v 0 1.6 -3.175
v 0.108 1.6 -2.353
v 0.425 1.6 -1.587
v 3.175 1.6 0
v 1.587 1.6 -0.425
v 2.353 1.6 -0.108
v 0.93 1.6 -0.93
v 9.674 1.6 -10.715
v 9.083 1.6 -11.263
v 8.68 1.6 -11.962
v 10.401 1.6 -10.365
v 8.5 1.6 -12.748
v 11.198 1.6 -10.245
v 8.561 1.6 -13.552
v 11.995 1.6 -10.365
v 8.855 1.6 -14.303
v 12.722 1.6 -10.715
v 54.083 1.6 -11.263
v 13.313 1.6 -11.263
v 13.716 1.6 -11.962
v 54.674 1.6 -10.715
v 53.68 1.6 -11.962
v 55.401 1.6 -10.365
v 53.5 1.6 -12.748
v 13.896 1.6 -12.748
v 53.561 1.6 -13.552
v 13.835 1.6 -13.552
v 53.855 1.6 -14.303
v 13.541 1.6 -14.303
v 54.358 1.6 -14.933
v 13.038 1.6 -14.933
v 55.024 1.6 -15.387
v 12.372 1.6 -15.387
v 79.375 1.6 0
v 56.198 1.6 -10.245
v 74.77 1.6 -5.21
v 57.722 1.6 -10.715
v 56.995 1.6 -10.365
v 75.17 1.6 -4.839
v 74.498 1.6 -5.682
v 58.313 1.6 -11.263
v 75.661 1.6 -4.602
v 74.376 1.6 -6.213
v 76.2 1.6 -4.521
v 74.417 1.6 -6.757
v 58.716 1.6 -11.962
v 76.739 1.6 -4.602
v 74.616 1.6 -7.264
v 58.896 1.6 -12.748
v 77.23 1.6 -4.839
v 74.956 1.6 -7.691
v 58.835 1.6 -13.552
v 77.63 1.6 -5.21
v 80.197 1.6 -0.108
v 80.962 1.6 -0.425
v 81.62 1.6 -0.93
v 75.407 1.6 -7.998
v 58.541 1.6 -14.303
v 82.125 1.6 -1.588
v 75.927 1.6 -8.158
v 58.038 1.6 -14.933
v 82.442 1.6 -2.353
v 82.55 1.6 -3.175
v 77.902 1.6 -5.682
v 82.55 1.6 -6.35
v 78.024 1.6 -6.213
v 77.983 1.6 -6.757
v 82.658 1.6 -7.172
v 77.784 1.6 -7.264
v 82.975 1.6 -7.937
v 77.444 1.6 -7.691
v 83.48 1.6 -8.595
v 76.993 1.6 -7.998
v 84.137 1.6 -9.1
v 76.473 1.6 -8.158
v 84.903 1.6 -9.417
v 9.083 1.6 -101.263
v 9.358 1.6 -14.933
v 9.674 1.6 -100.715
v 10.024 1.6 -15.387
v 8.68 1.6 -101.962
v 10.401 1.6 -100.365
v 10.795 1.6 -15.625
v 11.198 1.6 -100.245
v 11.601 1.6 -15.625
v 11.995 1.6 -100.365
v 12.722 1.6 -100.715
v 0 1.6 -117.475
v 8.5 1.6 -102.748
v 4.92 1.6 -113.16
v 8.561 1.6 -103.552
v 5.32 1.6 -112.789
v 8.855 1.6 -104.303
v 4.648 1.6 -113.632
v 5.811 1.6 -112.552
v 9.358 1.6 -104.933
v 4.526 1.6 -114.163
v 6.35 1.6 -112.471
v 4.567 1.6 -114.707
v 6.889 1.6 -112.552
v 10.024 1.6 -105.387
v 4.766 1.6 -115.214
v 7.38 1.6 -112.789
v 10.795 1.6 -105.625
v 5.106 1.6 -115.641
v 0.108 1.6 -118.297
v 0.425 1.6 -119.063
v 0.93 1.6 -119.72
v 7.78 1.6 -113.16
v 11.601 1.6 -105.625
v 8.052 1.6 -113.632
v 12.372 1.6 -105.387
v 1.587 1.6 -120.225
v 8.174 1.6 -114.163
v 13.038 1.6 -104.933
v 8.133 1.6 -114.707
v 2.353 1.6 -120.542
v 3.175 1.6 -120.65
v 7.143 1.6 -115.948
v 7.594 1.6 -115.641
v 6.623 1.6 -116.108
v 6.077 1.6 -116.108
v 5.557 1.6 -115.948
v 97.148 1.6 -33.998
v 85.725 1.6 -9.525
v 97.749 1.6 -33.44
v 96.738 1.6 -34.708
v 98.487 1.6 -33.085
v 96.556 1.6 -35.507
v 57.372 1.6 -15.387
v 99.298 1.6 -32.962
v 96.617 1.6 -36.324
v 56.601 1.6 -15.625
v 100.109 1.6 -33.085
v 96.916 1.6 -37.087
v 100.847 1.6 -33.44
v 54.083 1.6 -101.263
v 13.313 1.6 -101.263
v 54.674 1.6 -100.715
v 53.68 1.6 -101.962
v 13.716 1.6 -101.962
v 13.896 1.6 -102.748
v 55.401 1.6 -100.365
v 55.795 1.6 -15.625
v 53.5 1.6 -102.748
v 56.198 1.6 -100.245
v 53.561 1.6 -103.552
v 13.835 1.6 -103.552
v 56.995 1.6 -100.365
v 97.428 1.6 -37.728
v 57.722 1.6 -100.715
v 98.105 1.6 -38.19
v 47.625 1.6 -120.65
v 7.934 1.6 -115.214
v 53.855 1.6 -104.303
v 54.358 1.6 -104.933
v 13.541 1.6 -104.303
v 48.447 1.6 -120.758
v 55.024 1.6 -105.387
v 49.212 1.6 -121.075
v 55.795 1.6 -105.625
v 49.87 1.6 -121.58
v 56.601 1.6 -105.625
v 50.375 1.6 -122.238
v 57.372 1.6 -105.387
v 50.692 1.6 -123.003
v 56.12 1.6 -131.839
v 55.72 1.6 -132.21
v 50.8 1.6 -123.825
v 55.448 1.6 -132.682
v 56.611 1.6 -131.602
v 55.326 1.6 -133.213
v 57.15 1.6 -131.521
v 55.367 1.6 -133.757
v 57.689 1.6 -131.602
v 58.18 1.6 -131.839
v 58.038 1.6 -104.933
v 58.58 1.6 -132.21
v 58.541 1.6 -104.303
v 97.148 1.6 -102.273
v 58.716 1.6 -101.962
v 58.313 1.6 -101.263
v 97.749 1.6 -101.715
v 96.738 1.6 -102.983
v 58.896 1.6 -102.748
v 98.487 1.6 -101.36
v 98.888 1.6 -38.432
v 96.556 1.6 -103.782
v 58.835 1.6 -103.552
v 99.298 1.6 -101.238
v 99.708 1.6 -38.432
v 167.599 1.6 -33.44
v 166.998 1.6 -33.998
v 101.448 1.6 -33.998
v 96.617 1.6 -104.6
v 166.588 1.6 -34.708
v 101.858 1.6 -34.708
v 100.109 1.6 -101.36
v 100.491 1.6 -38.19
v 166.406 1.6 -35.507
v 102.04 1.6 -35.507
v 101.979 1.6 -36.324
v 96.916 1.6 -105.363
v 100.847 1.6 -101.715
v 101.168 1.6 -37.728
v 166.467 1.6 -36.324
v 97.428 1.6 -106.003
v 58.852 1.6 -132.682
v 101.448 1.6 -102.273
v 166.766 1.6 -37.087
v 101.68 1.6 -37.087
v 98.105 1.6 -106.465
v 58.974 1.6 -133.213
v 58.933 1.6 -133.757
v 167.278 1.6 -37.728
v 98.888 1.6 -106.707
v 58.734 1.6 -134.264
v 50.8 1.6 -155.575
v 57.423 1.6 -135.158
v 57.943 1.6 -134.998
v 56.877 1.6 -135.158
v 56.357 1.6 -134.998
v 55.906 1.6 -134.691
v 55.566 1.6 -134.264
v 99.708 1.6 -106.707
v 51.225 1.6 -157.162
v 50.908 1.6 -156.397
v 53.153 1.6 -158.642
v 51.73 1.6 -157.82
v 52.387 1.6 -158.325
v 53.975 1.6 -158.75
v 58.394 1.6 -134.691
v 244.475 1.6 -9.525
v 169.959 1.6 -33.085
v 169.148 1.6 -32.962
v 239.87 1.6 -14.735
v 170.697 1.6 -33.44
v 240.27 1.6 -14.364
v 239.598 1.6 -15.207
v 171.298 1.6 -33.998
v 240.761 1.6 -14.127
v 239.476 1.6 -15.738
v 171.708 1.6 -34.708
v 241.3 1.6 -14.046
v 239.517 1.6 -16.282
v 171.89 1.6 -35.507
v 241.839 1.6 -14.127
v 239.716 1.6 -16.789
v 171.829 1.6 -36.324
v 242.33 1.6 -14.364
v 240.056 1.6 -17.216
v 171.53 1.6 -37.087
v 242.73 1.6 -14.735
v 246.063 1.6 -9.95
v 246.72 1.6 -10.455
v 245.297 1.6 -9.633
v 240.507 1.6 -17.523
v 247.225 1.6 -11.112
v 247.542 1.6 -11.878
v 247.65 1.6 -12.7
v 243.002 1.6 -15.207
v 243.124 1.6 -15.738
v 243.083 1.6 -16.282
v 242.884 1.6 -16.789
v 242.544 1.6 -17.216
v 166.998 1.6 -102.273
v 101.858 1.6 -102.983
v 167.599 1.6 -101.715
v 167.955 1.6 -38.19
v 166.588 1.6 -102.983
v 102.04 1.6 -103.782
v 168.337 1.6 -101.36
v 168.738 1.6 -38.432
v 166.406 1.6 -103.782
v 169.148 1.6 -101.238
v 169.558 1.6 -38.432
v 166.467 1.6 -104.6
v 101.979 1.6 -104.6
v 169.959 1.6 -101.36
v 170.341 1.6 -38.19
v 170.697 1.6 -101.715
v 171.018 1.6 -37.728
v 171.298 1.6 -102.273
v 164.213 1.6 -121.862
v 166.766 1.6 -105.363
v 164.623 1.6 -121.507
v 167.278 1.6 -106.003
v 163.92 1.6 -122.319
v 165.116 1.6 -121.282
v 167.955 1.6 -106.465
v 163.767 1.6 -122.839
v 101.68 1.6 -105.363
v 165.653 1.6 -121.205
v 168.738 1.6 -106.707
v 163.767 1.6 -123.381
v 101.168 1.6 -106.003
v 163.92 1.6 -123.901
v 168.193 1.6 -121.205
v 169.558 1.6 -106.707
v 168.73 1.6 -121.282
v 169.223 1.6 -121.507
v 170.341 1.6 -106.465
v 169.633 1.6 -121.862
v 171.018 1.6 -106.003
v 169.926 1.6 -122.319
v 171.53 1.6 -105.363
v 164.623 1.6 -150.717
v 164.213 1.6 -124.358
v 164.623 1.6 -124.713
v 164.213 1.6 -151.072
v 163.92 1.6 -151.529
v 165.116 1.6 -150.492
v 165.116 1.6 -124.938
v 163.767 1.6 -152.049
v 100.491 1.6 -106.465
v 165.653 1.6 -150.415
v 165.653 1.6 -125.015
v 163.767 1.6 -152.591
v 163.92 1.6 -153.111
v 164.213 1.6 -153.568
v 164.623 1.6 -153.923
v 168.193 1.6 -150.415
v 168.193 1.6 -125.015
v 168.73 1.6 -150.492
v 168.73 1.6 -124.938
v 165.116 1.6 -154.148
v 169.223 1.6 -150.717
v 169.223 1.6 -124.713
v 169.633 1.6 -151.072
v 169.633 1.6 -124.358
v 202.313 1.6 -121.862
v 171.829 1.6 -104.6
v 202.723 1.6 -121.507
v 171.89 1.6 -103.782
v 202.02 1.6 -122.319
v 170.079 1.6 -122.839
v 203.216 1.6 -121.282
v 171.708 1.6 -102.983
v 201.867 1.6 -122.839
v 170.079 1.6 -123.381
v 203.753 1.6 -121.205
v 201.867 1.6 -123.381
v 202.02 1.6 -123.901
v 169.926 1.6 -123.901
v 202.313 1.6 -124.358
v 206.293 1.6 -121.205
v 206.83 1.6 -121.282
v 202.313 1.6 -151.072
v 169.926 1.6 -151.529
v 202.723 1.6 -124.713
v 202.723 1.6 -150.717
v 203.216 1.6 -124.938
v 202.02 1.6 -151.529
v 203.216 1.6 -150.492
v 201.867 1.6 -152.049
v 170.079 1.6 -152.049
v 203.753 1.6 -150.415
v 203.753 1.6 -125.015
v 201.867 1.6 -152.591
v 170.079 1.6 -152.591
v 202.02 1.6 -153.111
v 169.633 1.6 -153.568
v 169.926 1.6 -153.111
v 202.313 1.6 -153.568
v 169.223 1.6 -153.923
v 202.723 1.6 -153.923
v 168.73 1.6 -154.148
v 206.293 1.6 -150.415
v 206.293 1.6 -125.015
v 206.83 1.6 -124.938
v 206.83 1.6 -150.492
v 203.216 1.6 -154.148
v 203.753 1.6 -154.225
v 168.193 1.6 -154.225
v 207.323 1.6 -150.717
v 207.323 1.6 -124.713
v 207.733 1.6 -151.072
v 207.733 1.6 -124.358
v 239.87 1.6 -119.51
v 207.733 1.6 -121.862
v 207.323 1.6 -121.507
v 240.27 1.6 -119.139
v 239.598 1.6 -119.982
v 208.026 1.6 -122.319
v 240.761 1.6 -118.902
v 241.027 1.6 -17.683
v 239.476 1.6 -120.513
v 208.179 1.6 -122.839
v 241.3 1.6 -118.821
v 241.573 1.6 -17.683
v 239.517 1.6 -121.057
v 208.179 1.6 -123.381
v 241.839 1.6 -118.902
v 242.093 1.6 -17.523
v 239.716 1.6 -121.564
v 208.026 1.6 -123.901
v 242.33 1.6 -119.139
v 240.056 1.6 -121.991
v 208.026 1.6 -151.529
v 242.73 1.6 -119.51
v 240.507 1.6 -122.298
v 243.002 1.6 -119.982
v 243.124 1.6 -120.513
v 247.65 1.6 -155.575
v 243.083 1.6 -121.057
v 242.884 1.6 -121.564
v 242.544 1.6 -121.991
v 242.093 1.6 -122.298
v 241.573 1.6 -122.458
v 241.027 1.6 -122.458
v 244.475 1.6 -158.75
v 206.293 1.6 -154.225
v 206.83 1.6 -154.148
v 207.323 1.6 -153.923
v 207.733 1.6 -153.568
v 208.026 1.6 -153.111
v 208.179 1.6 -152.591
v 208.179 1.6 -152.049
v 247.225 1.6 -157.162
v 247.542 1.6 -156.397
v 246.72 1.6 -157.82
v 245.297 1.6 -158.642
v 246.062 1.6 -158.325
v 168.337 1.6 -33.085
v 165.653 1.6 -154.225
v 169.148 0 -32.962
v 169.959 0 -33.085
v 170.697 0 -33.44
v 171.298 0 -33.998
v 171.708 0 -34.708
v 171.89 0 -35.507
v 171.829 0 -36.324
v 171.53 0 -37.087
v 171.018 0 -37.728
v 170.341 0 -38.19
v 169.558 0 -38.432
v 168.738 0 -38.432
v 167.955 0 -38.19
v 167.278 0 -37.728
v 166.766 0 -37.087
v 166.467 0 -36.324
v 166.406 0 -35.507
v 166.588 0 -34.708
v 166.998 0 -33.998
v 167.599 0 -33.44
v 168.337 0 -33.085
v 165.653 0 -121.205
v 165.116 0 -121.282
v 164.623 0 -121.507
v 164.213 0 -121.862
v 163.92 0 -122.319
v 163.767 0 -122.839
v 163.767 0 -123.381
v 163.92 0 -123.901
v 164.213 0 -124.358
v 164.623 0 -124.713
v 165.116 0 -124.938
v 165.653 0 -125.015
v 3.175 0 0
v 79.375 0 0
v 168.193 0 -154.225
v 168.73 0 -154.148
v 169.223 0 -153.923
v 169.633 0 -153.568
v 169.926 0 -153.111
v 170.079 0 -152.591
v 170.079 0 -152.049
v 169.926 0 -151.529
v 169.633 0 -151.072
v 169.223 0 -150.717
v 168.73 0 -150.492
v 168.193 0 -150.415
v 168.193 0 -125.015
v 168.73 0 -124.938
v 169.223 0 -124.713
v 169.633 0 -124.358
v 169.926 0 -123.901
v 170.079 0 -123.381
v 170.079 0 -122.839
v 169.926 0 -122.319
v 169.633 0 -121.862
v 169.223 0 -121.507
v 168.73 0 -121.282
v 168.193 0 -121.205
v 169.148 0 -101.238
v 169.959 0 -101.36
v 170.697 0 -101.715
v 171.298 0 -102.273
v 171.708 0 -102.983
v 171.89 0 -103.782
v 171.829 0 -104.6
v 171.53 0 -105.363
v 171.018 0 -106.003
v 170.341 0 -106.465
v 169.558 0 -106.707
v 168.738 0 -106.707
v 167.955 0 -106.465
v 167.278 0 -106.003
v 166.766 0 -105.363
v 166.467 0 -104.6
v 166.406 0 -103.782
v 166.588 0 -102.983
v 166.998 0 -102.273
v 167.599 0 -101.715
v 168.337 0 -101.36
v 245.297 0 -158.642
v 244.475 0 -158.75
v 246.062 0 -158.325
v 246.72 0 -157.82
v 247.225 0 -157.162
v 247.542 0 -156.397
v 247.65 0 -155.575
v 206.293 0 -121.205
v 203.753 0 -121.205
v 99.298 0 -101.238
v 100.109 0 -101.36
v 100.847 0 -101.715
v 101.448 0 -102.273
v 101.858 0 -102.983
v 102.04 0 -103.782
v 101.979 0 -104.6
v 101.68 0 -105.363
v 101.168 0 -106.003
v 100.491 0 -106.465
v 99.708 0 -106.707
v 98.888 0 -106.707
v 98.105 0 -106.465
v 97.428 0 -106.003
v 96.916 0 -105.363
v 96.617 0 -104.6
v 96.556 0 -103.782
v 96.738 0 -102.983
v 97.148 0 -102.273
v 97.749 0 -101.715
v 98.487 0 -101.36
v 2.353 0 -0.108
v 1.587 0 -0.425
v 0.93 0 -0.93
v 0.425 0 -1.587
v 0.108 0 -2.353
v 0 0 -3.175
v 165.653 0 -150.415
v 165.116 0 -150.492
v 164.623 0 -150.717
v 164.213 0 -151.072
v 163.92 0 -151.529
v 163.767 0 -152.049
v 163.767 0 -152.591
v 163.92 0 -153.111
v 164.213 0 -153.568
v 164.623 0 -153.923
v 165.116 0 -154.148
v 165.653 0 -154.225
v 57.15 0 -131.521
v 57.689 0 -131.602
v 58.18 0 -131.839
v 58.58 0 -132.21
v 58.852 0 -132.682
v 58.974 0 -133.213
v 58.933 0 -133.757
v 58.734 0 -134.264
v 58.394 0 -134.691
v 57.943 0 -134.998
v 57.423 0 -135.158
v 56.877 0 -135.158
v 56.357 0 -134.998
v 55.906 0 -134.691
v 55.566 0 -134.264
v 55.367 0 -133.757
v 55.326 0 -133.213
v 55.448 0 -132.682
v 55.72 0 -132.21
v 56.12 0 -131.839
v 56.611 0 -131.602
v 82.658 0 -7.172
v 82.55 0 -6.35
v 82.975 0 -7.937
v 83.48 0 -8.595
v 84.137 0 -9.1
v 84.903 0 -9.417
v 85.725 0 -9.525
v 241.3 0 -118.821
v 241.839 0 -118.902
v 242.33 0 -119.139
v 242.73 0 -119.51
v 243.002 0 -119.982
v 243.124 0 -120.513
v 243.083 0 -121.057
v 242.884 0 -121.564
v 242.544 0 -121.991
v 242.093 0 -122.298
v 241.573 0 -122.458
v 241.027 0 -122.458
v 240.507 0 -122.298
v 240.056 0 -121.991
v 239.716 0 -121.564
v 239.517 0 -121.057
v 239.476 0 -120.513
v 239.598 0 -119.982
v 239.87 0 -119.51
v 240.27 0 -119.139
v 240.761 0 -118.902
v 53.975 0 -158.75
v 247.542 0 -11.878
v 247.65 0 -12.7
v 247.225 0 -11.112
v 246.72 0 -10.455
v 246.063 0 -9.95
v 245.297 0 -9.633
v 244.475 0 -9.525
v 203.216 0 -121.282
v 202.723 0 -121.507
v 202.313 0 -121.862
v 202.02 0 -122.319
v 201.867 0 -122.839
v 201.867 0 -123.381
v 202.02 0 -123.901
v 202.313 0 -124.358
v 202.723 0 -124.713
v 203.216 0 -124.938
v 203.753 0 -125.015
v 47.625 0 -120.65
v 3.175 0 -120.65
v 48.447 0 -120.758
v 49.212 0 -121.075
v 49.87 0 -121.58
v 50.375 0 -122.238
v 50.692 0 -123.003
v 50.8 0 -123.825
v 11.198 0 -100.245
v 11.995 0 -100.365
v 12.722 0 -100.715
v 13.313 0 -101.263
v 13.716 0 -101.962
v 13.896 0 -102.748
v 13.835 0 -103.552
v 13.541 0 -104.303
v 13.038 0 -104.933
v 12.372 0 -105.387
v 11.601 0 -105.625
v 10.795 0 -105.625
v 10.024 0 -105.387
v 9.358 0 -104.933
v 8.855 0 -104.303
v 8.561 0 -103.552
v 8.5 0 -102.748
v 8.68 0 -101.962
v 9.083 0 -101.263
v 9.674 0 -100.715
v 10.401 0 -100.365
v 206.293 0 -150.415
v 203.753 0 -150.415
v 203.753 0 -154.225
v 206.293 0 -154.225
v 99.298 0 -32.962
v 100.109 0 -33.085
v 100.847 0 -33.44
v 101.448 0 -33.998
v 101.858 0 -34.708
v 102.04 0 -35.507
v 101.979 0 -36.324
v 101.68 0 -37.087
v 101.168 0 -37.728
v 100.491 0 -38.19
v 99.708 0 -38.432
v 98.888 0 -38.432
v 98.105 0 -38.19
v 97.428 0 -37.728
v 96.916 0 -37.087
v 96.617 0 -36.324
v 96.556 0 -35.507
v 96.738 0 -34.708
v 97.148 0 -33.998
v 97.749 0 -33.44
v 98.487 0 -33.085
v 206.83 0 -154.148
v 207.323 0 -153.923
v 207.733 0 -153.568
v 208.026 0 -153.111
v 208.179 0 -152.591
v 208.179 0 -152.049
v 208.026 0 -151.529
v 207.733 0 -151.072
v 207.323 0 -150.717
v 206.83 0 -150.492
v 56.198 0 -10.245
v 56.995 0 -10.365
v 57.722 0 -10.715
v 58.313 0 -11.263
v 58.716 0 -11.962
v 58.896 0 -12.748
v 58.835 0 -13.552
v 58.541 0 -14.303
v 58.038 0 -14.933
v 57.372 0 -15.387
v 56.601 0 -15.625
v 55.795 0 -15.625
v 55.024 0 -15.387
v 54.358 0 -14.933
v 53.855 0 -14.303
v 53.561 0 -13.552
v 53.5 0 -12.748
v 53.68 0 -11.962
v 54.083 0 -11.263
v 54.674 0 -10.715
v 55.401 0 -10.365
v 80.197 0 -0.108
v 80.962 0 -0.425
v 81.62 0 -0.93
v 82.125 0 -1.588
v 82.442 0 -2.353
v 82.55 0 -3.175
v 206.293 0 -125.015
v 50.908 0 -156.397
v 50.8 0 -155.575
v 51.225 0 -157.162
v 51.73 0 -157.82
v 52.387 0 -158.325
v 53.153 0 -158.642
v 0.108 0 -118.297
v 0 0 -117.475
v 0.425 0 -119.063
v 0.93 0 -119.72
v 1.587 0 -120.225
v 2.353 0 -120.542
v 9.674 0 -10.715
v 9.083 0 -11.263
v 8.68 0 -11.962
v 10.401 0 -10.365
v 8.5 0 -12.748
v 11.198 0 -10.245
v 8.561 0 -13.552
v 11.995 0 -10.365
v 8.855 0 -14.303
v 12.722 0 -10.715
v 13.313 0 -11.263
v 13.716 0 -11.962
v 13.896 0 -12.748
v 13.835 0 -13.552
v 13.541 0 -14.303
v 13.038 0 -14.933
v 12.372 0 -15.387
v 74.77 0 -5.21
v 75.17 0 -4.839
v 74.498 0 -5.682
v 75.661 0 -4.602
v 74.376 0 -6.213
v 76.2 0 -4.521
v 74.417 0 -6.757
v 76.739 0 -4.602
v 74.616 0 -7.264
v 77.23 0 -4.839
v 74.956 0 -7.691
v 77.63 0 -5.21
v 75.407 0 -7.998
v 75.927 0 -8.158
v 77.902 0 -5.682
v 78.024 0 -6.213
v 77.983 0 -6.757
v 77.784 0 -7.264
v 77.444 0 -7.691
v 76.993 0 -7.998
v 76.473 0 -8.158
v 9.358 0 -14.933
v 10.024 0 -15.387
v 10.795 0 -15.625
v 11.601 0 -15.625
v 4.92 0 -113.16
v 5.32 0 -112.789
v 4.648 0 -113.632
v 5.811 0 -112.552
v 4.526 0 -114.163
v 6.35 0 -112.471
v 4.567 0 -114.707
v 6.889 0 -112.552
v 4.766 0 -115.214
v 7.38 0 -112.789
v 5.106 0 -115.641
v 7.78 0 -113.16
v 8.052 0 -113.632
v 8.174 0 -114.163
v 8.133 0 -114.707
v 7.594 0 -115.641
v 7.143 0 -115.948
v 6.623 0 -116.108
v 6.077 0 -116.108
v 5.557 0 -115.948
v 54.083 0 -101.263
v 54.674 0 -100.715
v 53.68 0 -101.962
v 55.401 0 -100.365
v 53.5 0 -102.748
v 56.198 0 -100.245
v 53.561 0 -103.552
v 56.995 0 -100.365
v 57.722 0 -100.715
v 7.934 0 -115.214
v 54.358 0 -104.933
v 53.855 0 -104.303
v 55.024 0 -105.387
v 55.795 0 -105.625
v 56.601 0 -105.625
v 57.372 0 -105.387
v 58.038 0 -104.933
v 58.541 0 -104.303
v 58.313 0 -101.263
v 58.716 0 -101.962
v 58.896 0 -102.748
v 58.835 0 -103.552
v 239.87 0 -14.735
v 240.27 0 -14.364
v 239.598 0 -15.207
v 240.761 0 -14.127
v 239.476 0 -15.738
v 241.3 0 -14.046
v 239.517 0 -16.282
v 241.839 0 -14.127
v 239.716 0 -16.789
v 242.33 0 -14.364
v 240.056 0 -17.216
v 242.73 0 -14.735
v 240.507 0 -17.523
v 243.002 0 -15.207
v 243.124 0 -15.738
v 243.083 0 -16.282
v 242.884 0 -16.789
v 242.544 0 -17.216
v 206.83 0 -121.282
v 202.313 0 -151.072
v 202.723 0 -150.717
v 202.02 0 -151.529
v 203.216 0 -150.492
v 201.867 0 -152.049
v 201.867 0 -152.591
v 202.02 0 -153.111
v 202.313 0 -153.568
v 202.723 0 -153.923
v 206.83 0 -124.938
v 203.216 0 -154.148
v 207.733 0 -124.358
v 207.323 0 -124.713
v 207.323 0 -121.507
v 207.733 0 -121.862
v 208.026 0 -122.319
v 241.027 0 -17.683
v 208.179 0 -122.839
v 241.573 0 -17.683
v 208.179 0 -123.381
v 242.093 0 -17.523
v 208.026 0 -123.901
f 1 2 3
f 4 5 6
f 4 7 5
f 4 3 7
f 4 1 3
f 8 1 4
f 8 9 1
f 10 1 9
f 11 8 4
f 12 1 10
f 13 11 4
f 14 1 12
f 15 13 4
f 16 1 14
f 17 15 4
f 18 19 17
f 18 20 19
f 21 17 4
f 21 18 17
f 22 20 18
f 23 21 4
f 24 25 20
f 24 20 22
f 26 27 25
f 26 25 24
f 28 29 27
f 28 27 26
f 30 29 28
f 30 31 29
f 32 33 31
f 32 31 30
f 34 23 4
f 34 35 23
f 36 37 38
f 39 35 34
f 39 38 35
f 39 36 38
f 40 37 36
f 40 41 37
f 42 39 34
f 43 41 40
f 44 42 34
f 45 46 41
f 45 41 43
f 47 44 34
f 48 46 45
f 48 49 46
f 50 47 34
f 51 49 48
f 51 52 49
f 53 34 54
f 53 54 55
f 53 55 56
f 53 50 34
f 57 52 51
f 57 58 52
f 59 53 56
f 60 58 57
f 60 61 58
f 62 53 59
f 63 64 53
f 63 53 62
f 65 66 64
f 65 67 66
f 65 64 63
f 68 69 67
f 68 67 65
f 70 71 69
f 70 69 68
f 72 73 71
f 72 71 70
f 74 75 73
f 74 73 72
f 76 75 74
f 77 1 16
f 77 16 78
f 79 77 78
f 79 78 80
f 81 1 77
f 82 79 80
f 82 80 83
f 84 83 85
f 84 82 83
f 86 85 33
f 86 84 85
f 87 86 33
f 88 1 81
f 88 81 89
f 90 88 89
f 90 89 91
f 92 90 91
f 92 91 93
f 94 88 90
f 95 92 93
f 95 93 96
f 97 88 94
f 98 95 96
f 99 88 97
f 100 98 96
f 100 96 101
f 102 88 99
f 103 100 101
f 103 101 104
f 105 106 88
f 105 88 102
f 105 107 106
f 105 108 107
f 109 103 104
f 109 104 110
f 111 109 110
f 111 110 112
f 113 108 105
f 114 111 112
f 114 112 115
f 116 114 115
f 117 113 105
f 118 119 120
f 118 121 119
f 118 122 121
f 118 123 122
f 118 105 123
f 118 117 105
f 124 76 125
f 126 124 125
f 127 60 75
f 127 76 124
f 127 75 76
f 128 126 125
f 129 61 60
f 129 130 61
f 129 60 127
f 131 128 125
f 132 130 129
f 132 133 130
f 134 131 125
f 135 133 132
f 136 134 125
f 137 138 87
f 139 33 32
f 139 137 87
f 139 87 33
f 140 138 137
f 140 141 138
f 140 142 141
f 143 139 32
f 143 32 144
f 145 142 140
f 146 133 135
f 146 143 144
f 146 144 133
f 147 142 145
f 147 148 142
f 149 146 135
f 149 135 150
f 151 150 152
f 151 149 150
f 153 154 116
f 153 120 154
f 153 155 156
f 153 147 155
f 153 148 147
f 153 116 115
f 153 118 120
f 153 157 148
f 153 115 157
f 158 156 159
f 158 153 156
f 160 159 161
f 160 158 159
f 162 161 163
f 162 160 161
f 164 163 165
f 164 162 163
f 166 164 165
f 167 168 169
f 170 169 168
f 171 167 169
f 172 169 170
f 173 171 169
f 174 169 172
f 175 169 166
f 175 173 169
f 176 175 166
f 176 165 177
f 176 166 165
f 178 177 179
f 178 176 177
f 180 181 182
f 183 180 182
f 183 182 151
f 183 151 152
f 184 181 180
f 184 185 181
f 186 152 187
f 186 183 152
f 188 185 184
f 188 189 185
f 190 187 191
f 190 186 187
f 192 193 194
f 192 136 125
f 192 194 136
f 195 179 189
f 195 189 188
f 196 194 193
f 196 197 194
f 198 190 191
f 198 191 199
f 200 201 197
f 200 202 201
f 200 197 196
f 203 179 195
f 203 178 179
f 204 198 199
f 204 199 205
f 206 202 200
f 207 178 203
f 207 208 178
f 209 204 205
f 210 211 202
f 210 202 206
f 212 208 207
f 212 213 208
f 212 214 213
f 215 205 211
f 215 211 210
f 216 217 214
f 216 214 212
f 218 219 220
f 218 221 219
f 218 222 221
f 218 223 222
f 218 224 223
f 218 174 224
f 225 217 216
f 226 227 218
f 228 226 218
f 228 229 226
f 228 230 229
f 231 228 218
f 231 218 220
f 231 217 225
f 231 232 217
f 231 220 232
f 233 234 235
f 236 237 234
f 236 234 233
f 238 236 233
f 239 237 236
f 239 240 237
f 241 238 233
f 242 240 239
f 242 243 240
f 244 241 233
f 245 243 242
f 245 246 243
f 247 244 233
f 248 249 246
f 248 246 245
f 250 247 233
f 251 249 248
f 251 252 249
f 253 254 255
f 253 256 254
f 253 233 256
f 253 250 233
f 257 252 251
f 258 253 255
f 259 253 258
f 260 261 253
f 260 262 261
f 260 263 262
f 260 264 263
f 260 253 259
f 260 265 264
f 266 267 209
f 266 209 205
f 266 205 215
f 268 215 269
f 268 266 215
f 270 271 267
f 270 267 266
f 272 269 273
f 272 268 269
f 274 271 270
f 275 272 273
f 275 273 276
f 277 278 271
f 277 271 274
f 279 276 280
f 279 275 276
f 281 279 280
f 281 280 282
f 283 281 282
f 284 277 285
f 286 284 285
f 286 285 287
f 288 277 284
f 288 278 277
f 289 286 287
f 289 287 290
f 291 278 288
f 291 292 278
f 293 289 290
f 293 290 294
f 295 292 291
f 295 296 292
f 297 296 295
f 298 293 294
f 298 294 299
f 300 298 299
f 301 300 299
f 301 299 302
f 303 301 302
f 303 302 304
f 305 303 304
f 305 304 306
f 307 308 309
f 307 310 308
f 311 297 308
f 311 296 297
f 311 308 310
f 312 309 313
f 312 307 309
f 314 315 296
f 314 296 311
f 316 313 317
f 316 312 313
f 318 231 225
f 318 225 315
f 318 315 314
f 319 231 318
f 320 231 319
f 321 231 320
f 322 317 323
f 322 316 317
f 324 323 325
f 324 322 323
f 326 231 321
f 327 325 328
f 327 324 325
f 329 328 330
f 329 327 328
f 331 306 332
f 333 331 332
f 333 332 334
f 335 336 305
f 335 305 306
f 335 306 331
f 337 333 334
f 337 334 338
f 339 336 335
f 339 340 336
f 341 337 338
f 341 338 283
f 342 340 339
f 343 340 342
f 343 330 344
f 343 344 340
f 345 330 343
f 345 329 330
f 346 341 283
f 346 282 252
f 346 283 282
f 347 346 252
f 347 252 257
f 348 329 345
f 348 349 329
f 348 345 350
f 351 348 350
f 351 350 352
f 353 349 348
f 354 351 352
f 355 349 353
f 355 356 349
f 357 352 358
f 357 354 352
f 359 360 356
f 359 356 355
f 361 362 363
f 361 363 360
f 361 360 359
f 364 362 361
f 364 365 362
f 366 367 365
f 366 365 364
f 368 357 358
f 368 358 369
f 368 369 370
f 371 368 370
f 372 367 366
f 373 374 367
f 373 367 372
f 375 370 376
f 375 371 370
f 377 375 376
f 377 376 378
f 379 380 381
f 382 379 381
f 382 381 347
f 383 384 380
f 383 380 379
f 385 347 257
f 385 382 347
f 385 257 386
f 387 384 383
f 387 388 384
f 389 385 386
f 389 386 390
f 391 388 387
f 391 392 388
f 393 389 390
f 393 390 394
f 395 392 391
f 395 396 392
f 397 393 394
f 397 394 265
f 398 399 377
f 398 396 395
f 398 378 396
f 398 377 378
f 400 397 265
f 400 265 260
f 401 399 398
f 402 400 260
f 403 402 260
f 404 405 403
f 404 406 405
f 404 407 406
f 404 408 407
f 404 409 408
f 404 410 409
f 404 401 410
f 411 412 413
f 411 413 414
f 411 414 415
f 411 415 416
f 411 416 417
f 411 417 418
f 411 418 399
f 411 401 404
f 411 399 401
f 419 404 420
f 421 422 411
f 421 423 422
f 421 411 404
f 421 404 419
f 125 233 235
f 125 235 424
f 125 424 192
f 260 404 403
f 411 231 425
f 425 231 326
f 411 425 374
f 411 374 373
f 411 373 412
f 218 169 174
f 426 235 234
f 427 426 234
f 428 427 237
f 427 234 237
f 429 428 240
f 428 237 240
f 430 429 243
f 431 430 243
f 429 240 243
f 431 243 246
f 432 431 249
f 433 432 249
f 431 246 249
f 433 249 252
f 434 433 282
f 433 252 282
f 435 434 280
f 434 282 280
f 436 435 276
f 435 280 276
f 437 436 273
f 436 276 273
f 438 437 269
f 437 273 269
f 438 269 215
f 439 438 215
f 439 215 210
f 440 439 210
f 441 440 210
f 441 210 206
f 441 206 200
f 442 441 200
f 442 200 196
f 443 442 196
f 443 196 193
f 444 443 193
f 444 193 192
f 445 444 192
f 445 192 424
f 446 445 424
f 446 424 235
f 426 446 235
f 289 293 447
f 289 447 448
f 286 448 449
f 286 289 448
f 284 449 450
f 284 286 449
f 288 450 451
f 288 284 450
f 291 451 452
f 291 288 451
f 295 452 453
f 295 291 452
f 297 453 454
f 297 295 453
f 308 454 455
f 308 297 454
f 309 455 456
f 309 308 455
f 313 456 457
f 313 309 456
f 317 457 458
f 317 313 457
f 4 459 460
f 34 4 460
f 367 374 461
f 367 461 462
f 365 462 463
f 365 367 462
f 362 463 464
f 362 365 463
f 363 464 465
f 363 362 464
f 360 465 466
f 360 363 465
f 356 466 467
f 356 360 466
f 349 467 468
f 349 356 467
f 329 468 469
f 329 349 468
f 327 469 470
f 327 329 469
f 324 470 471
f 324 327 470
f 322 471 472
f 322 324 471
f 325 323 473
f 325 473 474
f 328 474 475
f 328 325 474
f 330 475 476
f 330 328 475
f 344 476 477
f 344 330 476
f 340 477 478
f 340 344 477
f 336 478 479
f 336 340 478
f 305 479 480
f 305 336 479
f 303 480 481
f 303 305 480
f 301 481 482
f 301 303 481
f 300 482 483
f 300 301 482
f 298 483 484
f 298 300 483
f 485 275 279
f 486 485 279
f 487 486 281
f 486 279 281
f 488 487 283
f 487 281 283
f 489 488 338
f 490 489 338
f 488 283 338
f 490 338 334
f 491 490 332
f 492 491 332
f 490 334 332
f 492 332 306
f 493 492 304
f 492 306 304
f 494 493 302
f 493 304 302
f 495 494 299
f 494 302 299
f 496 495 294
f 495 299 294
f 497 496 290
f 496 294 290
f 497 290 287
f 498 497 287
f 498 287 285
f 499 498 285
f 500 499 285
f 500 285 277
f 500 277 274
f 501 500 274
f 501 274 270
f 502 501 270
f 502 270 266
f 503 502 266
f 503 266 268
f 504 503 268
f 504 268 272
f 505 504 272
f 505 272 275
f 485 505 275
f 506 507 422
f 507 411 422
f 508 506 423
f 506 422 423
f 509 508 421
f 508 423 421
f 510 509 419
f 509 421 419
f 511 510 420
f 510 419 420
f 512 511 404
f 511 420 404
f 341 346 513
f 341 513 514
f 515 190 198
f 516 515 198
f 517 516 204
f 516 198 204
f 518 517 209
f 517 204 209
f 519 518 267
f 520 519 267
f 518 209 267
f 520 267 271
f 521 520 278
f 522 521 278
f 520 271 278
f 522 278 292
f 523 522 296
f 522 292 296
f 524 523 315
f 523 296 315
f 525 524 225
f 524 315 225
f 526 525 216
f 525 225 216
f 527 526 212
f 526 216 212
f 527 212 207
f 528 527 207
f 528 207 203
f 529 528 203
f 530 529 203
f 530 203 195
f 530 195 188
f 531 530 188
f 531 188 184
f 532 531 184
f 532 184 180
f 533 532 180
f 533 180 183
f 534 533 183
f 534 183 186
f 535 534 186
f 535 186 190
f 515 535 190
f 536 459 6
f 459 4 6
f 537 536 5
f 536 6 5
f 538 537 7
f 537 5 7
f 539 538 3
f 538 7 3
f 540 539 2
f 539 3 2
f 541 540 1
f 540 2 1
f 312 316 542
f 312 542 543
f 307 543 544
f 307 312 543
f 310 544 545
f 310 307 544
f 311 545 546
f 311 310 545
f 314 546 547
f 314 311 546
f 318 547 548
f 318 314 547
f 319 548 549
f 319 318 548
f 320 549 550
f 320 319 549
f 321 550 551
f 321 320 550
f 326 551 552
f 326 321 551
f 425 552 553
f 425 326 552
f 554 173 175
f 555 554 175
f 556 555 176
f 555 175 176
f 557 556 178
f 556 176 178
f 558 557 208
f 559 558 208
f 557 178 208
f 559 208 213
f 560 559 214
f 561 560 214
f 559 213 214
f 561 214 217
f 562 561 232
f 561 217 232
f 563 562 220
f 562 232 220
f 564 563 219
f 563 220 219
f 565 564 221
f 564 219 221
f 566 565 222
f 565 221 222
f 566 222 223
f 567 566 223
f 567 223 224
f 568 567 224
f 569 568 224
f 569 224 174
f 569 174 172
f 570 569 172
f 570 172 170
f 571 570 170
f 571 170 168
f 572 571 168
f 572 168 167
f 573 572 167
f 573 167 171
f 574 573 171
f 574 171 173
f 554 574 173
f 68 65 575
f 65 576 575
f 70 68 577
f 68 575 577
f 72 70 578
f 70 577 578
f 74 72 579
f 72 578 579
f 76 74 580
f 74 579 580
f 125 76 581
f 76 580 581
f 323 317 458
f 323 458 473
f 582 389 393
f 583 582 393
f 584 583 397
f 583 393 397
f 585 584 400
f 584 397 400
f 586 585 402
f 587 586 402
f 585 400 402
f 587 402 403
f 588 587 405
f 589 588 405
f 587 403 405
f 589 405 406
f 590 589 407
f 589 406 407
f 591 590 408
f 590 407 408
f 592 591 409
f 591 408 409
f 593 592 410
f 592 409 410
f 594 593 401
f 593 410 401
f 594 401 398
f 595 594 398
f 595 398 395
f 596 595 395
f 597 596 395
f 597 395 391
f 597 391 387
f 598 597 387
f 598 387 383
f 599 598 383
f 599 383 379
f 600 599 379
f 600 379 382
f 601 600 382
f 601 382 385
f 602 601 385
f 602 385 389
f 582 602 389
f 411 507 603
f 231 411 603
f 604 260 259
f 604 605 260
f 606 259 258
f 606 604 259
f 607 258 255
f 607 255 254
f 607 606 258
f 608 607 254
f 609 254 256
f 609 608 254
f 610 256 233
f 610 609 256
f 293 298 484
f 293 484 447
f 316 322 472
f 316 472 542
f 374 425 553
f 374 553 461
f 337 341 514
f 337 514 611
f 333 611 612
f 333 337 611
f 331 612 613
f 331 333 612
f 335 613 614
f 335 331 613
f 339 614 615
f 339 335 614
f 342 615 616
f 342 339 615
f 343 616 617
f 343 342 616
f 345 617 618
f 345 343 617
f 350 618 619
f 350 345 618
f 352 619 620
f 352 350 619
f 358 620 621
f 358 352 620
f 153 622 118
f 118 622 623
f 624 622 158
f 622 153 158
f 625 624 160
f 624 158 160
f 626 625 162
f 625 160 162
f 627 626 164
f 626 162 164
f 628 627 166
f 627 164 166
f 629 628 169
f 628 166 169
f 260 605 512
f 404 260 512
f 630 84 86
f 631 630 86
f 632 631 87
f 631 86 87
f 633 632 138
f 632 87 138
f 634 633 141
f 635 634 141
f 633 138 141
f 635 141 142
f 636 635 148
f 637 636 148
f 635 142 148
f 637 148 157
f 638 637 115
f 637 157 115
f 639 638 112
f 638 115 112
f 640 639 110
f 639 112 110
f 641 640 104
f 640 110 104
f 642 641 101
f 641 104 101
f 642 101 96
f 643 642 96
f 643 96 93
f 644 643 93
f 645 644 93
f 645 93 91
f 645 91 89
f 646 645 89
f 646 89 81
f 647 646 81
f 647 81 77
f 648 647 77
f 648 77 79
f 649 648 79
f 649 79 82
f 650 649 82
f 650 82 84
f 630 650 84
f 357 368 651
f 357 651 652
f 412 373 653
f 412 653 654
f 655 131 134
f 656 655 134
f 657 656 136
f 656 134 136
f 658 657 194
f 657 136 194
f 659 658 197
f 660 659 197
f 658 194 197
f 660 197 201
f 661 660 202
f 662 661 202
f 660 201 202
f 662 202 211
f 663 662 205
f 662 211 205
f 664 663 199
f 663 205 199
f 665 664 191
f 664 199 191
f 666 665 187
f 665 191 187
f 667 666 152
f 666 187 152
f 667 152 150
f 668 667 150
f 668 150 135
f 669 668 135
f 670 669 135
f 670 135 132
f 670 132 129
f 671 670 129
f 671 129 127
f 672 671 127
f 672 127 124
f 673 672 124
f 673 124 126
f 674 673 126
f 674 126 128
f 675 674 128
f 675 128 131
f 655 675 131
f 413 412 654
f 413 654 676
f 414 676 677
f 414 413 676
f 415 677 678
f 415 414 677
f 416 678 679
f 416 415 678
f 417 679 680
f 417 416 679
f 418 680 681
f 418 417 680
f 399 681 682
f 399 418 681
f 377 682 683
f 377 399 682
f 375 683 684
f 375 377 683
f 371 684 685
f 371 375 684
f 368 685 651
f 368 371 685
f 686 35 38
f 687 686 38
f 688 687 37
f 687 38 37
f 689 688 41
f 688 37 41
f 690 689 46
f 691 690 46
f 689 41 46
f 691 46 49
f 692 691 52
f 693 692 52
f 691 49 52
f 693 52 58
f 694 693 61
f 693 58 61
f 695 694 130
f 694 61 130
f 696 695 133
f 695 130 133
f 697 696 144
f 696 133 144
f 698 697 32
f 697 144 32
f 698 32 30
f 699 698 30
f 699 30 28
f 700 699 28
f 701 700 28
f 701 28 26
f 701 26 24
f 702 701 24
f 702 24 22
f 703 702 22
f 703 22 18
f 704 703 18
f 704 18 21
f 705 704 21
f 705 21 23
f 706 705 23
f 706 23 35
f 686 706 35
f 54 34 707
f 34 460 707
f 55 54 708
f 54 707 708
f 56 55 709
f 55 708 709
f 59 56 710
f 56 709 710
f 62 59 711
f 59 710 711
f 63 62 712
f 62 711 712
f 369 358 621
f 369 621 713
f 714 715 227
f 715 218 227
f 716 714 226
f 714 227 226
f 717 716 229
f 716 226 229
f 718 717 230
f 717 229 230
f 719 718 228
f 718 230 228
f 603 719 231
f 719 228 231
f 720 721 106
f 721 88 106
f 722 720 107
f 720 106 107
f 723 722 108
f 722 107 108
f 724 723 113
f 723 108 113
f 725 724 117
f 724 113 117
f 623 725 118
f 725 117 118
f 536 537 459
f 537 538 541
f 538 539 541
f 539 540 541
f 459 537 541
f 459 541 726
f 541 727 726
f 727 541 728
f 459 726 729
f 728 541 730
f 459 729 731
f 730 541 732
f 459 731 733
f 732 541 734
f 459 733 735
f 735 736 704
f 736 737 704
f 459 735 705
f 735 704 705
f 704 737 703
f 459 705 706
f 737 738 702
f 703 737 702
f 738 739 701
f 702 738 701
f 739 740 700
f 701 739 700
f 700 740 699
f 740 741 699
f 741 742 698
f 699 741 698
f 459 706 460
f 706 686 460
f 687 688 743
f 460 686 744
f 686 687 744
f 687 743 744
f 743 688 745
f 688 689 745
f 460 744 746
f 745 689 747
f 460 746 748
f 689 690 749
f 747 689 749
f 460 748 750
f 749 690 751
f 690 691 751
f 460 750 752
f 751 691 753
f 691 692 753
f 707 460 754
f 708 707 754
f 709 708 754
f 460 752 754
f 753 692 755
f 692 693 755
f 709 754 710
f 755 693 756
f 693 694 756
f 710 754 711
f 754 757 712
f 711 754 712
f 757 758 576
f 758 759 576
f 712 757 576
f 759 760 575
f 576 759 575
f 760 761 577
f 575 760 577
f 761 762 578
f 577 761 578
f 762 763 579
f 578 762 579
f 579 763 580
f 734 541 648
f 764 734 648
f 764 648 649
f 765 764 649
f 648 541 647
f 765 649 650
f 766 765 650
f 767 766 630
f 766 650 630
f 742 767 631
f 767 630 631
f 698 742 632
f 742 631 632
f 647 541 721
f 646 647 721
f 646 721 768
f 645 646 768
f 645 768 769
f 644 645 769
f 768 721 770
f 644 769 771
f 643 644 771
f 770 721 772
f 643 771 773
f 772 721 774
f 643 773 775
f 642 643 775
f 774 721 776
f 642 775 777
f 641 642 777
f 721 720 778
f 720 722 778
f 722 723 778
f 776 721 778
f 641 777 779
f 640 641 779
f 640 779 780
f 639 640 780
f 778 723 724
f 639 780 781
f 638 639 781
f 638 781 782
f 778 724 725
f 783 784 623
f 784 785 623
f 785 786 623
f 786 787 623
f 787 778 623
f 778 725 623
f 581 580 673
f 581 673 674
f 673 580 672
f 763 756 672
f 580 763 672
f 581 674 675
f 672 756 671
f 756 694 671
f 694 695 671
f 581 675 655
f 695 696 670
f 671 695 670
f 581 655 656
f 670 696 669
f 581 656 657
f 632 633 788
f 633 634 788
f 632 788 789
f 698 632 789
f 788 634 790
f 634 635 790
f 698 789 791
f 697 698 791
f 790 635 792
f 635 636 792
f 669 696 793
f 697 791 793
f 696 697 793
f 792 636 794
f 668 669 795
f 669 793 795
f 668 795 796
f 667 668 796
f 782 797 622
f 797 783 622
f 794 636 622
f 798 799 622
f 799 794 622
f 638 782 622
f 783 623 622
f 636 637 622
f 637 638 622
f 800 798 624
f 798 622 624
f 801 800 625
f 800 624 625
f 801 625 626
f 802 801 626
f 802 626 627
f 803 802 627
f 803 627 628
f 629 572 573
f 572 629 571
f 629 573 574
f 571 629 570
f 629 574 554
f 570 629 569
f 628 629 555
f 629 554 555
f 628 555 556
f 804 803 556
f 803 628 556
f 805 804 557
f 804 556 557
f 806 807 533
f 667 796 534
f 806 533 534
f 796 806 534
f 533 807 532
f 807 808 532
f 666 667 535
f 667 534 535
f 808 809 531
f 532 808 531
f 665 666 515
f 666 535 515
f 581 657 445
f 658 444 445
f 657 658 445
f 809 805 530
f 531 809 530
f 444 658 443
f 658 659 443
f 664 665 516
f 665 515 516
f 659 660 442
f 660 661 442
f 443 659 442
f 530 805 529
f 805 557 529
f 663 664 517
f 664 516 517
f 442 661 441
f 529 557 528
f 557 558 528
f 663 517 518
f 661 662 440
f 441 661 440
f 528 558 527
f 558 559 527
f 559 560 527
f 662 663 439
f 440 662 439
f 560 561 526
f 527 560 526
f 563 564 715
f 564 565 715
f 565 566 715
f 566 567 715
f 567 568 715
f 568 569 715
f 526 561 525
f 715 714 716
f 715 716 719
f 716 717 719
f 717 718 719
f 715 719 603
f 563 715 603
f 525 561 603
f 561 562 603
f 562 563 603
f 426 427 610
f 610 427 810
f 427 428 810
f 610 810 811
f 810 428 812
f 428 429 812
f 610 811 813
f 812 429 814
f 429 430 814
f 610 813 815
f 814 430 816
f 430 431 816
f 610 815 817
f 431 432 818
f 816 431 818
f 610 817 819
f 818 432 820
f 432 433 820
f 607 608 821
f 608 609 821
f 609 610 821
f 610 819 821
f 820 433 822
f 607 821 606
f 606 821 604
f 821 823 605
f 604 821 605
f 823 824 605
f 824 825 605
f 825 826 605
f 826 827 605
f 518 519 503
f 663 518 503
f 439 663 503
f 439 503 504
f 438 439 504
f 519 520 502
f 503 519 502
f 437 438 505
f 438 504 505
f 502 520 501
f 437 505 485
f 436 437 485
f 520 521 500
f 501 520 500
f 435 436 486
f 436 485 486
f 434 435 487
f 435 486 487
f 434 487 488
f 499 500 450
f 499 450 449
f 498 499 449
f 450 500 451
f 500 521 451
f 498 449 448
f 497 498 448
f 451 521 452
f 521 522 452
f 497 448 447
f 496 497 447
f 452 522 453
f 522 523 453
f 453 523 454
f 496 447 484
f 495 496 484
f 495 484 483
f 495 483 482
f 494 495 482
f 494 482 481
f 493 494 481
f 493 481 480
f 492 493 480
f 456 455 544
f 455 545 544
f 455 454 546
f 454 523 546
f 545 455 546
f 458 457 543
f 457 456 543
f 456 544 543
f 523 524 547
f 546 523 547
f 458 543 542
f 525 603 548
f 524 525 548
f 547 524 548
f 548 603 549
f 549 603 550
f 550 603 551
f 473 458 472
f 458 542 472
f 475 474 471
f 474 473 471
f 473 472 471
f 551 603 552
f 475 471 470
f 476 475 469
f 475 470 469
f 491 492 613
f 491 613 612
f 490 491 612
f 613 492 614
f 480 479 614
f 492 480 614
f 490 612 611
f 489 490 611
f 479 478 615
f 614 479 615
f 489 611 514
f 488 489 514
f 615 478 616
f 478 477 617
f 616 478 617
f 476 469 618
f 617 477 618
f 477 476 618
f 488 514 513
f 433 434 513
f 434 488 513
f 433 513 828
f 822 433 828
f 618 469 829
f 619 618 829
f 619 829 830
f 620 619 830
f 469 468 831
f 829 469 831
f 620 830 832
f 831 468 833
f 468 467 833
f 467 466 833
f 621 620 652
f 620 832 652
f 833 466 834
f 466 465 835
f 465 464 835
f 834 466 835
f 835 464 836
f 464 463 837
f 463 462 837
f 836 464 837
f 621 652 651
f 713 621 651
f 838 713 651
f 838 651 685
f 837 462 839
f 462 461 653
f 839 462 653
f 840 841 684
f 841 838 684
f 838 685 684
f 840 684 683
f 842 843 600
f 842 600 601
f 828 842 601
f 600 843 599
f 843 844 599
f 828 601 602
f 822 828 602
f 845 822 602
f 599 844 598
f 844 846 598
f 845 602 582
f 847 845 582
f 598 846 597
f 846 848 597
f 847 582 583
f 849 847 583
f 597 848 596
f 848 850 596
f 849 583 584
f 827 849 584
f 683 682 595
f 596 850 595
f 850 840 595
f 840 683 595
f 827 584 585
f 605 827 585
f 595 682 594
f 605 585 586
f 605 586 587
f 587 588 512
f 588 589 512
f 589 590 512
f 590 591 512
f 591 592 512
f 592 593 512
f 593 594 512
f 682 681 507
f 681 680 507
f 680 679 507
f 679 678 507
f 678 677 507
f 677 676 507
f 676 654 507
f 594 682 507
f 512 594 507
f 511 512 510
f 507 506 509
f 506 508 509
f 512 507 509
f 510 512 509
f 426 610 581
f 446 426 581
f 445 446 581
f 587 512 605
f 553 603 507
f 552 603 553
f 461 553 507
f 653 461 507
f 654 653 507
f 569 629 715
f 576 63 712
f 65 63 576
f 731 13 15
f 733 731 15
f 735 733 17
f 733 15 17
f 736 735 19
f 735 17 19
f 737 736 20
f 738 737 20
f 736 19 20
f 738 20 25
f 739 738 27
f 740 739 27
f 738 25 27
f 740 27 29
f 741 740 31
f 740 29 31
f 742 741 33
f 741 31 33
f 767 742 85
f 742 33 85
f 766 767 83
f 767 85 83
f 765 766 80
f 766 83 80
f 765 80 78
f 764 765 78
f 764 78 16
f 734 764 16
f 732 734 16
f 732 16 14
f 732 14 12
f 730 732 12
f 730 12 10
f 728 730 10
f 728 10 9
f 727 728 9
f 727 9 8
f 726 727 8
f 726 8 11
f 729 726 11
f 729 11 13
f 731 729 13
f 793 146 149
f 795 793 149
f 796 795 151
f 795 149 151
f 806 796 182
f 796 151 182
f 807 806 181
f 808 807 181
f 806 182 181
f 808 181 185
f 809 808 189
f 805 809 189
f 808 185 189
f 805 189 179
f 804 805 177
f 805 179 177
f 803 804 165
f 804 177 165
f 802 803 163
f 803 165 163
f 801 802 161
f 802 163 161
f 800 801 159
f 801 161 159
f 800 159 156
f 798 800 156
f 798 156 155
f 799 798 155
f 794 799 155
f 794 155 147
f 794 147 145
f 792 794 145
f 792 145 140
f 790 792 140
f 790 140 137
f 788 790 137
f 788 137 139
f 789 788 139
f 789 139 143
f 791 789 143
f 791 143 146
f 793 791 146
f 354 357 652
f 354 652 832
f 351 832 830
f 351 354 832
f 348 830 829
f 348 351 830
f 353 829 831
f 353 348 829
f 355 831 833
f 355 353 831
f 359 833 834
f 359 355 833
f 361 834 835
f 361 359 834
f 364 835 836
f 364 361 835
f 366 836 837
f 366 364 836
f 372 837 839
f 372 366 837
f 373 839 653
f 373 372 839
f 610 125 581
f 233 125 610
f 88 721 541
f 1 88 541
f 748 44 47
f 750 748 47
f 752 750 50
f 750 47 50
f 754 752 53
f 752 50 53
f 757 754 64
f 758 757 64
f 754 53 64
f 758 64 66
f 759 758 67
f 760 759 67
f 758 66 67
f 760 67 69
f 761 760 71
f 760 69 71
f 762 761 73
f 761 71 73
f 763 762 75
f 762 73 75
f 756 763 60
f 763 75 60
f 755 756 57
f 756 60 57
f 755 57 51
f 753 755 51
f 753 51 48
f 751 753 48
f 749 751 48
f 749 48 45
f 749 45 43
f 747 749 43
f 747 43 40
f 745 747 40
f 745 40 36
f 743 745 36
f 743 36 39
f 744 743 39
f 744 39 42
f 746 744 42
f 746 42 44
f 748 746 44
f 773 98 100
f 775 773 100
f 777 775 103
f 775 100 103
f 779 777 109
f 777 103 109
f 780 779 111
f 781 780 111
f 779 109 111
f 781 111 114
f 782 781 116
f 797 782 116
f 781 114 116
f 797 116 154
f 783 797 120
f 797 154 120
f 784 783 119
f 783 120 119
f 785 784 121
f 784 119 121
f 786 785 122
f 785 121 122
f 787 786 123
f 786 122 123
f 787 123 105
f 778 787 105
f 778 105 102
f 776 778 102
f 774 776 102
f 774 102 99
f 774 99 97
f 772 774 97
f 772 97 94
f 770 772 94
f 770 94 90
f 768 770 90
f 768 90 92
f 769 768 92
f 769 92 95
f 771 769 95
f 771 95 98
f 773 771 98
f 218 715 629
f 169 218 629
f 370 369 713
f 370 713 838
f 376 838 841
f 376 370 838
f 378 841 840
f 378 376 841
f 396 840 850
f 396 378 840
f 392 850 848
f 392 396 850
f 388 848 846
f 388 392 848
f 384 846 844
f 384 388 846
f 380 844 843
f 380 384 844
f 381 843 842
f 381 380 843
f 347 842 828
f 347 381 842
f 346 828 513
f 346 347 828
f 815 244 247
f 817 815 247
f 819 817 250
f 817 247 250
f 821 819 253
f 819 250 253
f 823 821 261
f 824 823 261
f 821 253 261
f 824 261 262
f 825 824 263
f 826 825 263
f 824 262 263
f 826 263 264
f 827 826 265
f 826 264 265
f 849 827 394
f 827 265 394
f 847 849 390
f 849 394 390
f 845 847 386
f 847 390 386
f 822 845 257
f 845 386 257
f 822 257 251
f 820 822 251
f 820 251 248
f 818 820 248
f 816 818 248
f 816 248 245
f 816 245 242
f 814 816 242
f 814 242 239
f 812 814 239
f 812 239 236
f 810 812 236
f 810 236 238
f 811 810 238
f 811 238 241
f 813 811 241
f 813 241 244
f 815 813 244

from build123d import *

# Parameters (mm, degrees)
BOSS_EXTRUDE1_DEPTH            = 1.6002
SKETCH3_W                      = 165.1
SKETCH3_H                      = 9.525
CUT_EXTRUDE1_DEPTH             = 295.167716856
FILLET1_R                      = 3.175
FUSE_ZIPTIE_MOUNTS_DEPTH       = 295.167716856
SKETCH5_R                      = 2.75
CONTACTOR_MOUNTING_HOLES_DEPTH = 295.167716856
SKETCH6_R                      = 1.8288
CUT_EXTRUDE2_DEPTH             = 295.167716856
SKETCH7_R                      = 2.7051
CUT_EXTRUDE3_DEPTH             = 295.167716856


with BuildPart() as part:
    # Sketch1 → Boss-Extrude1 (new body)
    with BuildSketch(Plane(origin=(0, 0, 0), x_dir=(1, 0, 0), z_dir=(0, 1, 0))):
        Polygon((0, 0), (247.65, 0), (247.65, 158.75), (50.8, 158.75), (50.8, 120.65), (0, 120.65), align=None)
    extrude(amount=BOSS_EXTRUDE1_DEPTH)

    # Sketch3 → Cut-Extrude1 (cut, through all)
    with BuildSketch(Plane(origin=(0, 1.6002, 0), x_dir=(1, 0, 0), z_dir=(0, 1, 0))):
        with Locations((165.1, 4.7625)):
            Rectangle(SKETCH3_W, SKETCH3_H)
    extrude(amount=-CUT_EXTRUDE1_DEPTH, mode=Mode.SUBTRACT)

    # Fillet1
    fillet1_edges = [part.edges().sort_by_distance(p)[0] for p in [
        (247.65, 0.8001, -158.75),
        (0, 0.8001, 0),
        (0, 0.8001, -120.65),
        (50.8, 0.8001, -120.65),
        (50.8, 0.8001, -158.75),
        (82.55, 0.8001, 0),
        (82.55, 0.8001, -9.525),
        (247.65, 0.8001, -9.525),
    ]]
    fillet(fillet1_edges, radius=FILLET1_R)

    # Sketch4 → Fuse Ziptie Mounts (cut, through all)
    with BuildSketch(Plane(origin=(0, 1.6002, 0), x_dir=(1, 0, 0), z_dir=(0, 1, 0))):
        with BuildLine():
            Line((165.653, 154.225), (168.193, 154.225))
            ThreePointArc((168.193, 154.225), (170.098, 152.32), (168.193, 150.415))
            Line((168.193, 150.415), (165.653, 150.415))
            ThreePointArc((165.653, 150.415), (163.748, 152.32), (165.653, 154.225))
        make_face()
        with BuildLine():
            Line((203.753, 154.225), (206.293, 154.225))
            ThreePointArc((206.293, 154.225), (208.198, 152.32), (206.293, 150.415))
            Line((206.293, 150.415), (203.753, 150.415))
            ThreePointArc((203.753, 150.415), (201.848, 152.32), (203.753, 154.225))
        make_face()
        with BuildLine():
            Line((203.753, 125.015), (206.293, 125.015))
            ThreePointArc((206.293, 125.015), (208.198, 123.11), (206.293, 121.205))
            Line((206.293, 121.205), (203.753, 121.205))
            ThreePointArc((203.753, 121.205), (201.848, 123.11), (203.753, 125.015))
        make_face()
        with BuildLine():
            Line((165.653, 125.015), (168.193, 125.015))
            ThreePointArc((168.193, 125.015), (170.098, 123.11), (168.193, 121.205))
            Line((168.193, 121.205), (165.653, 121.205))
            ThreePointArc((165.653, 121.205), (163.748, 123.11), (165.653, 125.015))
        make_face()
    extrude(amount=-FUSE_ZIPTIE_MOUNTS_DEPTH, mode=Mode.SUBTRACT)

    # Sketch5 → Contactor Mounting Holes (cut, through all)
    with BuildSketch(Plane(origin=(0, 1.6002, 0), x_dir=(1, 0, 0), z_dir=(0, 1, 0))):
        with Locations(Location((99.298, 103.9876, 0), (0, 0, 270))):
            Circle(SKETCH5_R)
        with Locations(Location((99.298, 35.7124, 0), (0, 0, 270))):
            Circle(SKETCH5_R)
        with Locations(Location((169.148, 103.9876, 0), (0, 0, 270))):
            Circle(SKETCH5_R)
        with Locations(Location((169.148, 35.7124, 0), (0, 0, 270))):
            Circle(SKETCH5_R)
    extrude(amount=-CONTACTOR_MOUNTING_HOLES_DEPTH, mode=Mode.SUBTRACT)

    # Sketch6 → Cut-Extrude2 (cut, through all)
    with BuildSketch(Plane(origin=(0, 1.6002, 0), x_dir=(1, 0, 0), z_dir=(0, 1, 0))):
        with Locations(Location((6.35, 114.3, 0), (0, 0, 270))):
            Circle(SKETCH6_R)
        with Locations(Location((76.2, 6.35, 0), (0, 0, 270))):
            Circle(SKETCH6_R)
        with Locations(Location((241.3, 15.875, 0), (0, 0, 270))):
            Circle(SKETCH6_R)
        with Locations(Location((241.3, 120.65, 0), (0, 0, 270))):
            Circle(SKETCH6_R)
        with Locations(Location((57.15, 133.35, 0), (0, 0, 270))):
            Circle(SKETCH6_R)
    extrude(amount=-CUT_EXTRUDE2_DEPTH, mode=Mode.SUBTRACT)

    # Sketch7 → Cut-Extrude3 (cut, through all)
    with BuildSketch(Plane(origin=(0, 1.6002, 0), x_dir=(1, 0, 0), z_dir=(0, 1, 0))):
        with Locations(Location((11.198, 102.95, 0), (0, 0, 270))):
            Circle(SKETCH7_R)
        with Locations(Location((56.198, 102.95, 0), (0, 0, 270))):
            Circle(SKETCH7_R)
        with Locations(Location((11.198, 12.95, 0), (0, 0, 270))):
            Circle(SKETCH7_R)
        with Locations(Location((56.198, 12.95, 0), (0, 0, 270))):
            Circle(SKETCH7_R)
    extrude(amount=-CUT_EXTRUDE3_DEPTH, mode=Mode.SUBTRACT)


solid = part.part
